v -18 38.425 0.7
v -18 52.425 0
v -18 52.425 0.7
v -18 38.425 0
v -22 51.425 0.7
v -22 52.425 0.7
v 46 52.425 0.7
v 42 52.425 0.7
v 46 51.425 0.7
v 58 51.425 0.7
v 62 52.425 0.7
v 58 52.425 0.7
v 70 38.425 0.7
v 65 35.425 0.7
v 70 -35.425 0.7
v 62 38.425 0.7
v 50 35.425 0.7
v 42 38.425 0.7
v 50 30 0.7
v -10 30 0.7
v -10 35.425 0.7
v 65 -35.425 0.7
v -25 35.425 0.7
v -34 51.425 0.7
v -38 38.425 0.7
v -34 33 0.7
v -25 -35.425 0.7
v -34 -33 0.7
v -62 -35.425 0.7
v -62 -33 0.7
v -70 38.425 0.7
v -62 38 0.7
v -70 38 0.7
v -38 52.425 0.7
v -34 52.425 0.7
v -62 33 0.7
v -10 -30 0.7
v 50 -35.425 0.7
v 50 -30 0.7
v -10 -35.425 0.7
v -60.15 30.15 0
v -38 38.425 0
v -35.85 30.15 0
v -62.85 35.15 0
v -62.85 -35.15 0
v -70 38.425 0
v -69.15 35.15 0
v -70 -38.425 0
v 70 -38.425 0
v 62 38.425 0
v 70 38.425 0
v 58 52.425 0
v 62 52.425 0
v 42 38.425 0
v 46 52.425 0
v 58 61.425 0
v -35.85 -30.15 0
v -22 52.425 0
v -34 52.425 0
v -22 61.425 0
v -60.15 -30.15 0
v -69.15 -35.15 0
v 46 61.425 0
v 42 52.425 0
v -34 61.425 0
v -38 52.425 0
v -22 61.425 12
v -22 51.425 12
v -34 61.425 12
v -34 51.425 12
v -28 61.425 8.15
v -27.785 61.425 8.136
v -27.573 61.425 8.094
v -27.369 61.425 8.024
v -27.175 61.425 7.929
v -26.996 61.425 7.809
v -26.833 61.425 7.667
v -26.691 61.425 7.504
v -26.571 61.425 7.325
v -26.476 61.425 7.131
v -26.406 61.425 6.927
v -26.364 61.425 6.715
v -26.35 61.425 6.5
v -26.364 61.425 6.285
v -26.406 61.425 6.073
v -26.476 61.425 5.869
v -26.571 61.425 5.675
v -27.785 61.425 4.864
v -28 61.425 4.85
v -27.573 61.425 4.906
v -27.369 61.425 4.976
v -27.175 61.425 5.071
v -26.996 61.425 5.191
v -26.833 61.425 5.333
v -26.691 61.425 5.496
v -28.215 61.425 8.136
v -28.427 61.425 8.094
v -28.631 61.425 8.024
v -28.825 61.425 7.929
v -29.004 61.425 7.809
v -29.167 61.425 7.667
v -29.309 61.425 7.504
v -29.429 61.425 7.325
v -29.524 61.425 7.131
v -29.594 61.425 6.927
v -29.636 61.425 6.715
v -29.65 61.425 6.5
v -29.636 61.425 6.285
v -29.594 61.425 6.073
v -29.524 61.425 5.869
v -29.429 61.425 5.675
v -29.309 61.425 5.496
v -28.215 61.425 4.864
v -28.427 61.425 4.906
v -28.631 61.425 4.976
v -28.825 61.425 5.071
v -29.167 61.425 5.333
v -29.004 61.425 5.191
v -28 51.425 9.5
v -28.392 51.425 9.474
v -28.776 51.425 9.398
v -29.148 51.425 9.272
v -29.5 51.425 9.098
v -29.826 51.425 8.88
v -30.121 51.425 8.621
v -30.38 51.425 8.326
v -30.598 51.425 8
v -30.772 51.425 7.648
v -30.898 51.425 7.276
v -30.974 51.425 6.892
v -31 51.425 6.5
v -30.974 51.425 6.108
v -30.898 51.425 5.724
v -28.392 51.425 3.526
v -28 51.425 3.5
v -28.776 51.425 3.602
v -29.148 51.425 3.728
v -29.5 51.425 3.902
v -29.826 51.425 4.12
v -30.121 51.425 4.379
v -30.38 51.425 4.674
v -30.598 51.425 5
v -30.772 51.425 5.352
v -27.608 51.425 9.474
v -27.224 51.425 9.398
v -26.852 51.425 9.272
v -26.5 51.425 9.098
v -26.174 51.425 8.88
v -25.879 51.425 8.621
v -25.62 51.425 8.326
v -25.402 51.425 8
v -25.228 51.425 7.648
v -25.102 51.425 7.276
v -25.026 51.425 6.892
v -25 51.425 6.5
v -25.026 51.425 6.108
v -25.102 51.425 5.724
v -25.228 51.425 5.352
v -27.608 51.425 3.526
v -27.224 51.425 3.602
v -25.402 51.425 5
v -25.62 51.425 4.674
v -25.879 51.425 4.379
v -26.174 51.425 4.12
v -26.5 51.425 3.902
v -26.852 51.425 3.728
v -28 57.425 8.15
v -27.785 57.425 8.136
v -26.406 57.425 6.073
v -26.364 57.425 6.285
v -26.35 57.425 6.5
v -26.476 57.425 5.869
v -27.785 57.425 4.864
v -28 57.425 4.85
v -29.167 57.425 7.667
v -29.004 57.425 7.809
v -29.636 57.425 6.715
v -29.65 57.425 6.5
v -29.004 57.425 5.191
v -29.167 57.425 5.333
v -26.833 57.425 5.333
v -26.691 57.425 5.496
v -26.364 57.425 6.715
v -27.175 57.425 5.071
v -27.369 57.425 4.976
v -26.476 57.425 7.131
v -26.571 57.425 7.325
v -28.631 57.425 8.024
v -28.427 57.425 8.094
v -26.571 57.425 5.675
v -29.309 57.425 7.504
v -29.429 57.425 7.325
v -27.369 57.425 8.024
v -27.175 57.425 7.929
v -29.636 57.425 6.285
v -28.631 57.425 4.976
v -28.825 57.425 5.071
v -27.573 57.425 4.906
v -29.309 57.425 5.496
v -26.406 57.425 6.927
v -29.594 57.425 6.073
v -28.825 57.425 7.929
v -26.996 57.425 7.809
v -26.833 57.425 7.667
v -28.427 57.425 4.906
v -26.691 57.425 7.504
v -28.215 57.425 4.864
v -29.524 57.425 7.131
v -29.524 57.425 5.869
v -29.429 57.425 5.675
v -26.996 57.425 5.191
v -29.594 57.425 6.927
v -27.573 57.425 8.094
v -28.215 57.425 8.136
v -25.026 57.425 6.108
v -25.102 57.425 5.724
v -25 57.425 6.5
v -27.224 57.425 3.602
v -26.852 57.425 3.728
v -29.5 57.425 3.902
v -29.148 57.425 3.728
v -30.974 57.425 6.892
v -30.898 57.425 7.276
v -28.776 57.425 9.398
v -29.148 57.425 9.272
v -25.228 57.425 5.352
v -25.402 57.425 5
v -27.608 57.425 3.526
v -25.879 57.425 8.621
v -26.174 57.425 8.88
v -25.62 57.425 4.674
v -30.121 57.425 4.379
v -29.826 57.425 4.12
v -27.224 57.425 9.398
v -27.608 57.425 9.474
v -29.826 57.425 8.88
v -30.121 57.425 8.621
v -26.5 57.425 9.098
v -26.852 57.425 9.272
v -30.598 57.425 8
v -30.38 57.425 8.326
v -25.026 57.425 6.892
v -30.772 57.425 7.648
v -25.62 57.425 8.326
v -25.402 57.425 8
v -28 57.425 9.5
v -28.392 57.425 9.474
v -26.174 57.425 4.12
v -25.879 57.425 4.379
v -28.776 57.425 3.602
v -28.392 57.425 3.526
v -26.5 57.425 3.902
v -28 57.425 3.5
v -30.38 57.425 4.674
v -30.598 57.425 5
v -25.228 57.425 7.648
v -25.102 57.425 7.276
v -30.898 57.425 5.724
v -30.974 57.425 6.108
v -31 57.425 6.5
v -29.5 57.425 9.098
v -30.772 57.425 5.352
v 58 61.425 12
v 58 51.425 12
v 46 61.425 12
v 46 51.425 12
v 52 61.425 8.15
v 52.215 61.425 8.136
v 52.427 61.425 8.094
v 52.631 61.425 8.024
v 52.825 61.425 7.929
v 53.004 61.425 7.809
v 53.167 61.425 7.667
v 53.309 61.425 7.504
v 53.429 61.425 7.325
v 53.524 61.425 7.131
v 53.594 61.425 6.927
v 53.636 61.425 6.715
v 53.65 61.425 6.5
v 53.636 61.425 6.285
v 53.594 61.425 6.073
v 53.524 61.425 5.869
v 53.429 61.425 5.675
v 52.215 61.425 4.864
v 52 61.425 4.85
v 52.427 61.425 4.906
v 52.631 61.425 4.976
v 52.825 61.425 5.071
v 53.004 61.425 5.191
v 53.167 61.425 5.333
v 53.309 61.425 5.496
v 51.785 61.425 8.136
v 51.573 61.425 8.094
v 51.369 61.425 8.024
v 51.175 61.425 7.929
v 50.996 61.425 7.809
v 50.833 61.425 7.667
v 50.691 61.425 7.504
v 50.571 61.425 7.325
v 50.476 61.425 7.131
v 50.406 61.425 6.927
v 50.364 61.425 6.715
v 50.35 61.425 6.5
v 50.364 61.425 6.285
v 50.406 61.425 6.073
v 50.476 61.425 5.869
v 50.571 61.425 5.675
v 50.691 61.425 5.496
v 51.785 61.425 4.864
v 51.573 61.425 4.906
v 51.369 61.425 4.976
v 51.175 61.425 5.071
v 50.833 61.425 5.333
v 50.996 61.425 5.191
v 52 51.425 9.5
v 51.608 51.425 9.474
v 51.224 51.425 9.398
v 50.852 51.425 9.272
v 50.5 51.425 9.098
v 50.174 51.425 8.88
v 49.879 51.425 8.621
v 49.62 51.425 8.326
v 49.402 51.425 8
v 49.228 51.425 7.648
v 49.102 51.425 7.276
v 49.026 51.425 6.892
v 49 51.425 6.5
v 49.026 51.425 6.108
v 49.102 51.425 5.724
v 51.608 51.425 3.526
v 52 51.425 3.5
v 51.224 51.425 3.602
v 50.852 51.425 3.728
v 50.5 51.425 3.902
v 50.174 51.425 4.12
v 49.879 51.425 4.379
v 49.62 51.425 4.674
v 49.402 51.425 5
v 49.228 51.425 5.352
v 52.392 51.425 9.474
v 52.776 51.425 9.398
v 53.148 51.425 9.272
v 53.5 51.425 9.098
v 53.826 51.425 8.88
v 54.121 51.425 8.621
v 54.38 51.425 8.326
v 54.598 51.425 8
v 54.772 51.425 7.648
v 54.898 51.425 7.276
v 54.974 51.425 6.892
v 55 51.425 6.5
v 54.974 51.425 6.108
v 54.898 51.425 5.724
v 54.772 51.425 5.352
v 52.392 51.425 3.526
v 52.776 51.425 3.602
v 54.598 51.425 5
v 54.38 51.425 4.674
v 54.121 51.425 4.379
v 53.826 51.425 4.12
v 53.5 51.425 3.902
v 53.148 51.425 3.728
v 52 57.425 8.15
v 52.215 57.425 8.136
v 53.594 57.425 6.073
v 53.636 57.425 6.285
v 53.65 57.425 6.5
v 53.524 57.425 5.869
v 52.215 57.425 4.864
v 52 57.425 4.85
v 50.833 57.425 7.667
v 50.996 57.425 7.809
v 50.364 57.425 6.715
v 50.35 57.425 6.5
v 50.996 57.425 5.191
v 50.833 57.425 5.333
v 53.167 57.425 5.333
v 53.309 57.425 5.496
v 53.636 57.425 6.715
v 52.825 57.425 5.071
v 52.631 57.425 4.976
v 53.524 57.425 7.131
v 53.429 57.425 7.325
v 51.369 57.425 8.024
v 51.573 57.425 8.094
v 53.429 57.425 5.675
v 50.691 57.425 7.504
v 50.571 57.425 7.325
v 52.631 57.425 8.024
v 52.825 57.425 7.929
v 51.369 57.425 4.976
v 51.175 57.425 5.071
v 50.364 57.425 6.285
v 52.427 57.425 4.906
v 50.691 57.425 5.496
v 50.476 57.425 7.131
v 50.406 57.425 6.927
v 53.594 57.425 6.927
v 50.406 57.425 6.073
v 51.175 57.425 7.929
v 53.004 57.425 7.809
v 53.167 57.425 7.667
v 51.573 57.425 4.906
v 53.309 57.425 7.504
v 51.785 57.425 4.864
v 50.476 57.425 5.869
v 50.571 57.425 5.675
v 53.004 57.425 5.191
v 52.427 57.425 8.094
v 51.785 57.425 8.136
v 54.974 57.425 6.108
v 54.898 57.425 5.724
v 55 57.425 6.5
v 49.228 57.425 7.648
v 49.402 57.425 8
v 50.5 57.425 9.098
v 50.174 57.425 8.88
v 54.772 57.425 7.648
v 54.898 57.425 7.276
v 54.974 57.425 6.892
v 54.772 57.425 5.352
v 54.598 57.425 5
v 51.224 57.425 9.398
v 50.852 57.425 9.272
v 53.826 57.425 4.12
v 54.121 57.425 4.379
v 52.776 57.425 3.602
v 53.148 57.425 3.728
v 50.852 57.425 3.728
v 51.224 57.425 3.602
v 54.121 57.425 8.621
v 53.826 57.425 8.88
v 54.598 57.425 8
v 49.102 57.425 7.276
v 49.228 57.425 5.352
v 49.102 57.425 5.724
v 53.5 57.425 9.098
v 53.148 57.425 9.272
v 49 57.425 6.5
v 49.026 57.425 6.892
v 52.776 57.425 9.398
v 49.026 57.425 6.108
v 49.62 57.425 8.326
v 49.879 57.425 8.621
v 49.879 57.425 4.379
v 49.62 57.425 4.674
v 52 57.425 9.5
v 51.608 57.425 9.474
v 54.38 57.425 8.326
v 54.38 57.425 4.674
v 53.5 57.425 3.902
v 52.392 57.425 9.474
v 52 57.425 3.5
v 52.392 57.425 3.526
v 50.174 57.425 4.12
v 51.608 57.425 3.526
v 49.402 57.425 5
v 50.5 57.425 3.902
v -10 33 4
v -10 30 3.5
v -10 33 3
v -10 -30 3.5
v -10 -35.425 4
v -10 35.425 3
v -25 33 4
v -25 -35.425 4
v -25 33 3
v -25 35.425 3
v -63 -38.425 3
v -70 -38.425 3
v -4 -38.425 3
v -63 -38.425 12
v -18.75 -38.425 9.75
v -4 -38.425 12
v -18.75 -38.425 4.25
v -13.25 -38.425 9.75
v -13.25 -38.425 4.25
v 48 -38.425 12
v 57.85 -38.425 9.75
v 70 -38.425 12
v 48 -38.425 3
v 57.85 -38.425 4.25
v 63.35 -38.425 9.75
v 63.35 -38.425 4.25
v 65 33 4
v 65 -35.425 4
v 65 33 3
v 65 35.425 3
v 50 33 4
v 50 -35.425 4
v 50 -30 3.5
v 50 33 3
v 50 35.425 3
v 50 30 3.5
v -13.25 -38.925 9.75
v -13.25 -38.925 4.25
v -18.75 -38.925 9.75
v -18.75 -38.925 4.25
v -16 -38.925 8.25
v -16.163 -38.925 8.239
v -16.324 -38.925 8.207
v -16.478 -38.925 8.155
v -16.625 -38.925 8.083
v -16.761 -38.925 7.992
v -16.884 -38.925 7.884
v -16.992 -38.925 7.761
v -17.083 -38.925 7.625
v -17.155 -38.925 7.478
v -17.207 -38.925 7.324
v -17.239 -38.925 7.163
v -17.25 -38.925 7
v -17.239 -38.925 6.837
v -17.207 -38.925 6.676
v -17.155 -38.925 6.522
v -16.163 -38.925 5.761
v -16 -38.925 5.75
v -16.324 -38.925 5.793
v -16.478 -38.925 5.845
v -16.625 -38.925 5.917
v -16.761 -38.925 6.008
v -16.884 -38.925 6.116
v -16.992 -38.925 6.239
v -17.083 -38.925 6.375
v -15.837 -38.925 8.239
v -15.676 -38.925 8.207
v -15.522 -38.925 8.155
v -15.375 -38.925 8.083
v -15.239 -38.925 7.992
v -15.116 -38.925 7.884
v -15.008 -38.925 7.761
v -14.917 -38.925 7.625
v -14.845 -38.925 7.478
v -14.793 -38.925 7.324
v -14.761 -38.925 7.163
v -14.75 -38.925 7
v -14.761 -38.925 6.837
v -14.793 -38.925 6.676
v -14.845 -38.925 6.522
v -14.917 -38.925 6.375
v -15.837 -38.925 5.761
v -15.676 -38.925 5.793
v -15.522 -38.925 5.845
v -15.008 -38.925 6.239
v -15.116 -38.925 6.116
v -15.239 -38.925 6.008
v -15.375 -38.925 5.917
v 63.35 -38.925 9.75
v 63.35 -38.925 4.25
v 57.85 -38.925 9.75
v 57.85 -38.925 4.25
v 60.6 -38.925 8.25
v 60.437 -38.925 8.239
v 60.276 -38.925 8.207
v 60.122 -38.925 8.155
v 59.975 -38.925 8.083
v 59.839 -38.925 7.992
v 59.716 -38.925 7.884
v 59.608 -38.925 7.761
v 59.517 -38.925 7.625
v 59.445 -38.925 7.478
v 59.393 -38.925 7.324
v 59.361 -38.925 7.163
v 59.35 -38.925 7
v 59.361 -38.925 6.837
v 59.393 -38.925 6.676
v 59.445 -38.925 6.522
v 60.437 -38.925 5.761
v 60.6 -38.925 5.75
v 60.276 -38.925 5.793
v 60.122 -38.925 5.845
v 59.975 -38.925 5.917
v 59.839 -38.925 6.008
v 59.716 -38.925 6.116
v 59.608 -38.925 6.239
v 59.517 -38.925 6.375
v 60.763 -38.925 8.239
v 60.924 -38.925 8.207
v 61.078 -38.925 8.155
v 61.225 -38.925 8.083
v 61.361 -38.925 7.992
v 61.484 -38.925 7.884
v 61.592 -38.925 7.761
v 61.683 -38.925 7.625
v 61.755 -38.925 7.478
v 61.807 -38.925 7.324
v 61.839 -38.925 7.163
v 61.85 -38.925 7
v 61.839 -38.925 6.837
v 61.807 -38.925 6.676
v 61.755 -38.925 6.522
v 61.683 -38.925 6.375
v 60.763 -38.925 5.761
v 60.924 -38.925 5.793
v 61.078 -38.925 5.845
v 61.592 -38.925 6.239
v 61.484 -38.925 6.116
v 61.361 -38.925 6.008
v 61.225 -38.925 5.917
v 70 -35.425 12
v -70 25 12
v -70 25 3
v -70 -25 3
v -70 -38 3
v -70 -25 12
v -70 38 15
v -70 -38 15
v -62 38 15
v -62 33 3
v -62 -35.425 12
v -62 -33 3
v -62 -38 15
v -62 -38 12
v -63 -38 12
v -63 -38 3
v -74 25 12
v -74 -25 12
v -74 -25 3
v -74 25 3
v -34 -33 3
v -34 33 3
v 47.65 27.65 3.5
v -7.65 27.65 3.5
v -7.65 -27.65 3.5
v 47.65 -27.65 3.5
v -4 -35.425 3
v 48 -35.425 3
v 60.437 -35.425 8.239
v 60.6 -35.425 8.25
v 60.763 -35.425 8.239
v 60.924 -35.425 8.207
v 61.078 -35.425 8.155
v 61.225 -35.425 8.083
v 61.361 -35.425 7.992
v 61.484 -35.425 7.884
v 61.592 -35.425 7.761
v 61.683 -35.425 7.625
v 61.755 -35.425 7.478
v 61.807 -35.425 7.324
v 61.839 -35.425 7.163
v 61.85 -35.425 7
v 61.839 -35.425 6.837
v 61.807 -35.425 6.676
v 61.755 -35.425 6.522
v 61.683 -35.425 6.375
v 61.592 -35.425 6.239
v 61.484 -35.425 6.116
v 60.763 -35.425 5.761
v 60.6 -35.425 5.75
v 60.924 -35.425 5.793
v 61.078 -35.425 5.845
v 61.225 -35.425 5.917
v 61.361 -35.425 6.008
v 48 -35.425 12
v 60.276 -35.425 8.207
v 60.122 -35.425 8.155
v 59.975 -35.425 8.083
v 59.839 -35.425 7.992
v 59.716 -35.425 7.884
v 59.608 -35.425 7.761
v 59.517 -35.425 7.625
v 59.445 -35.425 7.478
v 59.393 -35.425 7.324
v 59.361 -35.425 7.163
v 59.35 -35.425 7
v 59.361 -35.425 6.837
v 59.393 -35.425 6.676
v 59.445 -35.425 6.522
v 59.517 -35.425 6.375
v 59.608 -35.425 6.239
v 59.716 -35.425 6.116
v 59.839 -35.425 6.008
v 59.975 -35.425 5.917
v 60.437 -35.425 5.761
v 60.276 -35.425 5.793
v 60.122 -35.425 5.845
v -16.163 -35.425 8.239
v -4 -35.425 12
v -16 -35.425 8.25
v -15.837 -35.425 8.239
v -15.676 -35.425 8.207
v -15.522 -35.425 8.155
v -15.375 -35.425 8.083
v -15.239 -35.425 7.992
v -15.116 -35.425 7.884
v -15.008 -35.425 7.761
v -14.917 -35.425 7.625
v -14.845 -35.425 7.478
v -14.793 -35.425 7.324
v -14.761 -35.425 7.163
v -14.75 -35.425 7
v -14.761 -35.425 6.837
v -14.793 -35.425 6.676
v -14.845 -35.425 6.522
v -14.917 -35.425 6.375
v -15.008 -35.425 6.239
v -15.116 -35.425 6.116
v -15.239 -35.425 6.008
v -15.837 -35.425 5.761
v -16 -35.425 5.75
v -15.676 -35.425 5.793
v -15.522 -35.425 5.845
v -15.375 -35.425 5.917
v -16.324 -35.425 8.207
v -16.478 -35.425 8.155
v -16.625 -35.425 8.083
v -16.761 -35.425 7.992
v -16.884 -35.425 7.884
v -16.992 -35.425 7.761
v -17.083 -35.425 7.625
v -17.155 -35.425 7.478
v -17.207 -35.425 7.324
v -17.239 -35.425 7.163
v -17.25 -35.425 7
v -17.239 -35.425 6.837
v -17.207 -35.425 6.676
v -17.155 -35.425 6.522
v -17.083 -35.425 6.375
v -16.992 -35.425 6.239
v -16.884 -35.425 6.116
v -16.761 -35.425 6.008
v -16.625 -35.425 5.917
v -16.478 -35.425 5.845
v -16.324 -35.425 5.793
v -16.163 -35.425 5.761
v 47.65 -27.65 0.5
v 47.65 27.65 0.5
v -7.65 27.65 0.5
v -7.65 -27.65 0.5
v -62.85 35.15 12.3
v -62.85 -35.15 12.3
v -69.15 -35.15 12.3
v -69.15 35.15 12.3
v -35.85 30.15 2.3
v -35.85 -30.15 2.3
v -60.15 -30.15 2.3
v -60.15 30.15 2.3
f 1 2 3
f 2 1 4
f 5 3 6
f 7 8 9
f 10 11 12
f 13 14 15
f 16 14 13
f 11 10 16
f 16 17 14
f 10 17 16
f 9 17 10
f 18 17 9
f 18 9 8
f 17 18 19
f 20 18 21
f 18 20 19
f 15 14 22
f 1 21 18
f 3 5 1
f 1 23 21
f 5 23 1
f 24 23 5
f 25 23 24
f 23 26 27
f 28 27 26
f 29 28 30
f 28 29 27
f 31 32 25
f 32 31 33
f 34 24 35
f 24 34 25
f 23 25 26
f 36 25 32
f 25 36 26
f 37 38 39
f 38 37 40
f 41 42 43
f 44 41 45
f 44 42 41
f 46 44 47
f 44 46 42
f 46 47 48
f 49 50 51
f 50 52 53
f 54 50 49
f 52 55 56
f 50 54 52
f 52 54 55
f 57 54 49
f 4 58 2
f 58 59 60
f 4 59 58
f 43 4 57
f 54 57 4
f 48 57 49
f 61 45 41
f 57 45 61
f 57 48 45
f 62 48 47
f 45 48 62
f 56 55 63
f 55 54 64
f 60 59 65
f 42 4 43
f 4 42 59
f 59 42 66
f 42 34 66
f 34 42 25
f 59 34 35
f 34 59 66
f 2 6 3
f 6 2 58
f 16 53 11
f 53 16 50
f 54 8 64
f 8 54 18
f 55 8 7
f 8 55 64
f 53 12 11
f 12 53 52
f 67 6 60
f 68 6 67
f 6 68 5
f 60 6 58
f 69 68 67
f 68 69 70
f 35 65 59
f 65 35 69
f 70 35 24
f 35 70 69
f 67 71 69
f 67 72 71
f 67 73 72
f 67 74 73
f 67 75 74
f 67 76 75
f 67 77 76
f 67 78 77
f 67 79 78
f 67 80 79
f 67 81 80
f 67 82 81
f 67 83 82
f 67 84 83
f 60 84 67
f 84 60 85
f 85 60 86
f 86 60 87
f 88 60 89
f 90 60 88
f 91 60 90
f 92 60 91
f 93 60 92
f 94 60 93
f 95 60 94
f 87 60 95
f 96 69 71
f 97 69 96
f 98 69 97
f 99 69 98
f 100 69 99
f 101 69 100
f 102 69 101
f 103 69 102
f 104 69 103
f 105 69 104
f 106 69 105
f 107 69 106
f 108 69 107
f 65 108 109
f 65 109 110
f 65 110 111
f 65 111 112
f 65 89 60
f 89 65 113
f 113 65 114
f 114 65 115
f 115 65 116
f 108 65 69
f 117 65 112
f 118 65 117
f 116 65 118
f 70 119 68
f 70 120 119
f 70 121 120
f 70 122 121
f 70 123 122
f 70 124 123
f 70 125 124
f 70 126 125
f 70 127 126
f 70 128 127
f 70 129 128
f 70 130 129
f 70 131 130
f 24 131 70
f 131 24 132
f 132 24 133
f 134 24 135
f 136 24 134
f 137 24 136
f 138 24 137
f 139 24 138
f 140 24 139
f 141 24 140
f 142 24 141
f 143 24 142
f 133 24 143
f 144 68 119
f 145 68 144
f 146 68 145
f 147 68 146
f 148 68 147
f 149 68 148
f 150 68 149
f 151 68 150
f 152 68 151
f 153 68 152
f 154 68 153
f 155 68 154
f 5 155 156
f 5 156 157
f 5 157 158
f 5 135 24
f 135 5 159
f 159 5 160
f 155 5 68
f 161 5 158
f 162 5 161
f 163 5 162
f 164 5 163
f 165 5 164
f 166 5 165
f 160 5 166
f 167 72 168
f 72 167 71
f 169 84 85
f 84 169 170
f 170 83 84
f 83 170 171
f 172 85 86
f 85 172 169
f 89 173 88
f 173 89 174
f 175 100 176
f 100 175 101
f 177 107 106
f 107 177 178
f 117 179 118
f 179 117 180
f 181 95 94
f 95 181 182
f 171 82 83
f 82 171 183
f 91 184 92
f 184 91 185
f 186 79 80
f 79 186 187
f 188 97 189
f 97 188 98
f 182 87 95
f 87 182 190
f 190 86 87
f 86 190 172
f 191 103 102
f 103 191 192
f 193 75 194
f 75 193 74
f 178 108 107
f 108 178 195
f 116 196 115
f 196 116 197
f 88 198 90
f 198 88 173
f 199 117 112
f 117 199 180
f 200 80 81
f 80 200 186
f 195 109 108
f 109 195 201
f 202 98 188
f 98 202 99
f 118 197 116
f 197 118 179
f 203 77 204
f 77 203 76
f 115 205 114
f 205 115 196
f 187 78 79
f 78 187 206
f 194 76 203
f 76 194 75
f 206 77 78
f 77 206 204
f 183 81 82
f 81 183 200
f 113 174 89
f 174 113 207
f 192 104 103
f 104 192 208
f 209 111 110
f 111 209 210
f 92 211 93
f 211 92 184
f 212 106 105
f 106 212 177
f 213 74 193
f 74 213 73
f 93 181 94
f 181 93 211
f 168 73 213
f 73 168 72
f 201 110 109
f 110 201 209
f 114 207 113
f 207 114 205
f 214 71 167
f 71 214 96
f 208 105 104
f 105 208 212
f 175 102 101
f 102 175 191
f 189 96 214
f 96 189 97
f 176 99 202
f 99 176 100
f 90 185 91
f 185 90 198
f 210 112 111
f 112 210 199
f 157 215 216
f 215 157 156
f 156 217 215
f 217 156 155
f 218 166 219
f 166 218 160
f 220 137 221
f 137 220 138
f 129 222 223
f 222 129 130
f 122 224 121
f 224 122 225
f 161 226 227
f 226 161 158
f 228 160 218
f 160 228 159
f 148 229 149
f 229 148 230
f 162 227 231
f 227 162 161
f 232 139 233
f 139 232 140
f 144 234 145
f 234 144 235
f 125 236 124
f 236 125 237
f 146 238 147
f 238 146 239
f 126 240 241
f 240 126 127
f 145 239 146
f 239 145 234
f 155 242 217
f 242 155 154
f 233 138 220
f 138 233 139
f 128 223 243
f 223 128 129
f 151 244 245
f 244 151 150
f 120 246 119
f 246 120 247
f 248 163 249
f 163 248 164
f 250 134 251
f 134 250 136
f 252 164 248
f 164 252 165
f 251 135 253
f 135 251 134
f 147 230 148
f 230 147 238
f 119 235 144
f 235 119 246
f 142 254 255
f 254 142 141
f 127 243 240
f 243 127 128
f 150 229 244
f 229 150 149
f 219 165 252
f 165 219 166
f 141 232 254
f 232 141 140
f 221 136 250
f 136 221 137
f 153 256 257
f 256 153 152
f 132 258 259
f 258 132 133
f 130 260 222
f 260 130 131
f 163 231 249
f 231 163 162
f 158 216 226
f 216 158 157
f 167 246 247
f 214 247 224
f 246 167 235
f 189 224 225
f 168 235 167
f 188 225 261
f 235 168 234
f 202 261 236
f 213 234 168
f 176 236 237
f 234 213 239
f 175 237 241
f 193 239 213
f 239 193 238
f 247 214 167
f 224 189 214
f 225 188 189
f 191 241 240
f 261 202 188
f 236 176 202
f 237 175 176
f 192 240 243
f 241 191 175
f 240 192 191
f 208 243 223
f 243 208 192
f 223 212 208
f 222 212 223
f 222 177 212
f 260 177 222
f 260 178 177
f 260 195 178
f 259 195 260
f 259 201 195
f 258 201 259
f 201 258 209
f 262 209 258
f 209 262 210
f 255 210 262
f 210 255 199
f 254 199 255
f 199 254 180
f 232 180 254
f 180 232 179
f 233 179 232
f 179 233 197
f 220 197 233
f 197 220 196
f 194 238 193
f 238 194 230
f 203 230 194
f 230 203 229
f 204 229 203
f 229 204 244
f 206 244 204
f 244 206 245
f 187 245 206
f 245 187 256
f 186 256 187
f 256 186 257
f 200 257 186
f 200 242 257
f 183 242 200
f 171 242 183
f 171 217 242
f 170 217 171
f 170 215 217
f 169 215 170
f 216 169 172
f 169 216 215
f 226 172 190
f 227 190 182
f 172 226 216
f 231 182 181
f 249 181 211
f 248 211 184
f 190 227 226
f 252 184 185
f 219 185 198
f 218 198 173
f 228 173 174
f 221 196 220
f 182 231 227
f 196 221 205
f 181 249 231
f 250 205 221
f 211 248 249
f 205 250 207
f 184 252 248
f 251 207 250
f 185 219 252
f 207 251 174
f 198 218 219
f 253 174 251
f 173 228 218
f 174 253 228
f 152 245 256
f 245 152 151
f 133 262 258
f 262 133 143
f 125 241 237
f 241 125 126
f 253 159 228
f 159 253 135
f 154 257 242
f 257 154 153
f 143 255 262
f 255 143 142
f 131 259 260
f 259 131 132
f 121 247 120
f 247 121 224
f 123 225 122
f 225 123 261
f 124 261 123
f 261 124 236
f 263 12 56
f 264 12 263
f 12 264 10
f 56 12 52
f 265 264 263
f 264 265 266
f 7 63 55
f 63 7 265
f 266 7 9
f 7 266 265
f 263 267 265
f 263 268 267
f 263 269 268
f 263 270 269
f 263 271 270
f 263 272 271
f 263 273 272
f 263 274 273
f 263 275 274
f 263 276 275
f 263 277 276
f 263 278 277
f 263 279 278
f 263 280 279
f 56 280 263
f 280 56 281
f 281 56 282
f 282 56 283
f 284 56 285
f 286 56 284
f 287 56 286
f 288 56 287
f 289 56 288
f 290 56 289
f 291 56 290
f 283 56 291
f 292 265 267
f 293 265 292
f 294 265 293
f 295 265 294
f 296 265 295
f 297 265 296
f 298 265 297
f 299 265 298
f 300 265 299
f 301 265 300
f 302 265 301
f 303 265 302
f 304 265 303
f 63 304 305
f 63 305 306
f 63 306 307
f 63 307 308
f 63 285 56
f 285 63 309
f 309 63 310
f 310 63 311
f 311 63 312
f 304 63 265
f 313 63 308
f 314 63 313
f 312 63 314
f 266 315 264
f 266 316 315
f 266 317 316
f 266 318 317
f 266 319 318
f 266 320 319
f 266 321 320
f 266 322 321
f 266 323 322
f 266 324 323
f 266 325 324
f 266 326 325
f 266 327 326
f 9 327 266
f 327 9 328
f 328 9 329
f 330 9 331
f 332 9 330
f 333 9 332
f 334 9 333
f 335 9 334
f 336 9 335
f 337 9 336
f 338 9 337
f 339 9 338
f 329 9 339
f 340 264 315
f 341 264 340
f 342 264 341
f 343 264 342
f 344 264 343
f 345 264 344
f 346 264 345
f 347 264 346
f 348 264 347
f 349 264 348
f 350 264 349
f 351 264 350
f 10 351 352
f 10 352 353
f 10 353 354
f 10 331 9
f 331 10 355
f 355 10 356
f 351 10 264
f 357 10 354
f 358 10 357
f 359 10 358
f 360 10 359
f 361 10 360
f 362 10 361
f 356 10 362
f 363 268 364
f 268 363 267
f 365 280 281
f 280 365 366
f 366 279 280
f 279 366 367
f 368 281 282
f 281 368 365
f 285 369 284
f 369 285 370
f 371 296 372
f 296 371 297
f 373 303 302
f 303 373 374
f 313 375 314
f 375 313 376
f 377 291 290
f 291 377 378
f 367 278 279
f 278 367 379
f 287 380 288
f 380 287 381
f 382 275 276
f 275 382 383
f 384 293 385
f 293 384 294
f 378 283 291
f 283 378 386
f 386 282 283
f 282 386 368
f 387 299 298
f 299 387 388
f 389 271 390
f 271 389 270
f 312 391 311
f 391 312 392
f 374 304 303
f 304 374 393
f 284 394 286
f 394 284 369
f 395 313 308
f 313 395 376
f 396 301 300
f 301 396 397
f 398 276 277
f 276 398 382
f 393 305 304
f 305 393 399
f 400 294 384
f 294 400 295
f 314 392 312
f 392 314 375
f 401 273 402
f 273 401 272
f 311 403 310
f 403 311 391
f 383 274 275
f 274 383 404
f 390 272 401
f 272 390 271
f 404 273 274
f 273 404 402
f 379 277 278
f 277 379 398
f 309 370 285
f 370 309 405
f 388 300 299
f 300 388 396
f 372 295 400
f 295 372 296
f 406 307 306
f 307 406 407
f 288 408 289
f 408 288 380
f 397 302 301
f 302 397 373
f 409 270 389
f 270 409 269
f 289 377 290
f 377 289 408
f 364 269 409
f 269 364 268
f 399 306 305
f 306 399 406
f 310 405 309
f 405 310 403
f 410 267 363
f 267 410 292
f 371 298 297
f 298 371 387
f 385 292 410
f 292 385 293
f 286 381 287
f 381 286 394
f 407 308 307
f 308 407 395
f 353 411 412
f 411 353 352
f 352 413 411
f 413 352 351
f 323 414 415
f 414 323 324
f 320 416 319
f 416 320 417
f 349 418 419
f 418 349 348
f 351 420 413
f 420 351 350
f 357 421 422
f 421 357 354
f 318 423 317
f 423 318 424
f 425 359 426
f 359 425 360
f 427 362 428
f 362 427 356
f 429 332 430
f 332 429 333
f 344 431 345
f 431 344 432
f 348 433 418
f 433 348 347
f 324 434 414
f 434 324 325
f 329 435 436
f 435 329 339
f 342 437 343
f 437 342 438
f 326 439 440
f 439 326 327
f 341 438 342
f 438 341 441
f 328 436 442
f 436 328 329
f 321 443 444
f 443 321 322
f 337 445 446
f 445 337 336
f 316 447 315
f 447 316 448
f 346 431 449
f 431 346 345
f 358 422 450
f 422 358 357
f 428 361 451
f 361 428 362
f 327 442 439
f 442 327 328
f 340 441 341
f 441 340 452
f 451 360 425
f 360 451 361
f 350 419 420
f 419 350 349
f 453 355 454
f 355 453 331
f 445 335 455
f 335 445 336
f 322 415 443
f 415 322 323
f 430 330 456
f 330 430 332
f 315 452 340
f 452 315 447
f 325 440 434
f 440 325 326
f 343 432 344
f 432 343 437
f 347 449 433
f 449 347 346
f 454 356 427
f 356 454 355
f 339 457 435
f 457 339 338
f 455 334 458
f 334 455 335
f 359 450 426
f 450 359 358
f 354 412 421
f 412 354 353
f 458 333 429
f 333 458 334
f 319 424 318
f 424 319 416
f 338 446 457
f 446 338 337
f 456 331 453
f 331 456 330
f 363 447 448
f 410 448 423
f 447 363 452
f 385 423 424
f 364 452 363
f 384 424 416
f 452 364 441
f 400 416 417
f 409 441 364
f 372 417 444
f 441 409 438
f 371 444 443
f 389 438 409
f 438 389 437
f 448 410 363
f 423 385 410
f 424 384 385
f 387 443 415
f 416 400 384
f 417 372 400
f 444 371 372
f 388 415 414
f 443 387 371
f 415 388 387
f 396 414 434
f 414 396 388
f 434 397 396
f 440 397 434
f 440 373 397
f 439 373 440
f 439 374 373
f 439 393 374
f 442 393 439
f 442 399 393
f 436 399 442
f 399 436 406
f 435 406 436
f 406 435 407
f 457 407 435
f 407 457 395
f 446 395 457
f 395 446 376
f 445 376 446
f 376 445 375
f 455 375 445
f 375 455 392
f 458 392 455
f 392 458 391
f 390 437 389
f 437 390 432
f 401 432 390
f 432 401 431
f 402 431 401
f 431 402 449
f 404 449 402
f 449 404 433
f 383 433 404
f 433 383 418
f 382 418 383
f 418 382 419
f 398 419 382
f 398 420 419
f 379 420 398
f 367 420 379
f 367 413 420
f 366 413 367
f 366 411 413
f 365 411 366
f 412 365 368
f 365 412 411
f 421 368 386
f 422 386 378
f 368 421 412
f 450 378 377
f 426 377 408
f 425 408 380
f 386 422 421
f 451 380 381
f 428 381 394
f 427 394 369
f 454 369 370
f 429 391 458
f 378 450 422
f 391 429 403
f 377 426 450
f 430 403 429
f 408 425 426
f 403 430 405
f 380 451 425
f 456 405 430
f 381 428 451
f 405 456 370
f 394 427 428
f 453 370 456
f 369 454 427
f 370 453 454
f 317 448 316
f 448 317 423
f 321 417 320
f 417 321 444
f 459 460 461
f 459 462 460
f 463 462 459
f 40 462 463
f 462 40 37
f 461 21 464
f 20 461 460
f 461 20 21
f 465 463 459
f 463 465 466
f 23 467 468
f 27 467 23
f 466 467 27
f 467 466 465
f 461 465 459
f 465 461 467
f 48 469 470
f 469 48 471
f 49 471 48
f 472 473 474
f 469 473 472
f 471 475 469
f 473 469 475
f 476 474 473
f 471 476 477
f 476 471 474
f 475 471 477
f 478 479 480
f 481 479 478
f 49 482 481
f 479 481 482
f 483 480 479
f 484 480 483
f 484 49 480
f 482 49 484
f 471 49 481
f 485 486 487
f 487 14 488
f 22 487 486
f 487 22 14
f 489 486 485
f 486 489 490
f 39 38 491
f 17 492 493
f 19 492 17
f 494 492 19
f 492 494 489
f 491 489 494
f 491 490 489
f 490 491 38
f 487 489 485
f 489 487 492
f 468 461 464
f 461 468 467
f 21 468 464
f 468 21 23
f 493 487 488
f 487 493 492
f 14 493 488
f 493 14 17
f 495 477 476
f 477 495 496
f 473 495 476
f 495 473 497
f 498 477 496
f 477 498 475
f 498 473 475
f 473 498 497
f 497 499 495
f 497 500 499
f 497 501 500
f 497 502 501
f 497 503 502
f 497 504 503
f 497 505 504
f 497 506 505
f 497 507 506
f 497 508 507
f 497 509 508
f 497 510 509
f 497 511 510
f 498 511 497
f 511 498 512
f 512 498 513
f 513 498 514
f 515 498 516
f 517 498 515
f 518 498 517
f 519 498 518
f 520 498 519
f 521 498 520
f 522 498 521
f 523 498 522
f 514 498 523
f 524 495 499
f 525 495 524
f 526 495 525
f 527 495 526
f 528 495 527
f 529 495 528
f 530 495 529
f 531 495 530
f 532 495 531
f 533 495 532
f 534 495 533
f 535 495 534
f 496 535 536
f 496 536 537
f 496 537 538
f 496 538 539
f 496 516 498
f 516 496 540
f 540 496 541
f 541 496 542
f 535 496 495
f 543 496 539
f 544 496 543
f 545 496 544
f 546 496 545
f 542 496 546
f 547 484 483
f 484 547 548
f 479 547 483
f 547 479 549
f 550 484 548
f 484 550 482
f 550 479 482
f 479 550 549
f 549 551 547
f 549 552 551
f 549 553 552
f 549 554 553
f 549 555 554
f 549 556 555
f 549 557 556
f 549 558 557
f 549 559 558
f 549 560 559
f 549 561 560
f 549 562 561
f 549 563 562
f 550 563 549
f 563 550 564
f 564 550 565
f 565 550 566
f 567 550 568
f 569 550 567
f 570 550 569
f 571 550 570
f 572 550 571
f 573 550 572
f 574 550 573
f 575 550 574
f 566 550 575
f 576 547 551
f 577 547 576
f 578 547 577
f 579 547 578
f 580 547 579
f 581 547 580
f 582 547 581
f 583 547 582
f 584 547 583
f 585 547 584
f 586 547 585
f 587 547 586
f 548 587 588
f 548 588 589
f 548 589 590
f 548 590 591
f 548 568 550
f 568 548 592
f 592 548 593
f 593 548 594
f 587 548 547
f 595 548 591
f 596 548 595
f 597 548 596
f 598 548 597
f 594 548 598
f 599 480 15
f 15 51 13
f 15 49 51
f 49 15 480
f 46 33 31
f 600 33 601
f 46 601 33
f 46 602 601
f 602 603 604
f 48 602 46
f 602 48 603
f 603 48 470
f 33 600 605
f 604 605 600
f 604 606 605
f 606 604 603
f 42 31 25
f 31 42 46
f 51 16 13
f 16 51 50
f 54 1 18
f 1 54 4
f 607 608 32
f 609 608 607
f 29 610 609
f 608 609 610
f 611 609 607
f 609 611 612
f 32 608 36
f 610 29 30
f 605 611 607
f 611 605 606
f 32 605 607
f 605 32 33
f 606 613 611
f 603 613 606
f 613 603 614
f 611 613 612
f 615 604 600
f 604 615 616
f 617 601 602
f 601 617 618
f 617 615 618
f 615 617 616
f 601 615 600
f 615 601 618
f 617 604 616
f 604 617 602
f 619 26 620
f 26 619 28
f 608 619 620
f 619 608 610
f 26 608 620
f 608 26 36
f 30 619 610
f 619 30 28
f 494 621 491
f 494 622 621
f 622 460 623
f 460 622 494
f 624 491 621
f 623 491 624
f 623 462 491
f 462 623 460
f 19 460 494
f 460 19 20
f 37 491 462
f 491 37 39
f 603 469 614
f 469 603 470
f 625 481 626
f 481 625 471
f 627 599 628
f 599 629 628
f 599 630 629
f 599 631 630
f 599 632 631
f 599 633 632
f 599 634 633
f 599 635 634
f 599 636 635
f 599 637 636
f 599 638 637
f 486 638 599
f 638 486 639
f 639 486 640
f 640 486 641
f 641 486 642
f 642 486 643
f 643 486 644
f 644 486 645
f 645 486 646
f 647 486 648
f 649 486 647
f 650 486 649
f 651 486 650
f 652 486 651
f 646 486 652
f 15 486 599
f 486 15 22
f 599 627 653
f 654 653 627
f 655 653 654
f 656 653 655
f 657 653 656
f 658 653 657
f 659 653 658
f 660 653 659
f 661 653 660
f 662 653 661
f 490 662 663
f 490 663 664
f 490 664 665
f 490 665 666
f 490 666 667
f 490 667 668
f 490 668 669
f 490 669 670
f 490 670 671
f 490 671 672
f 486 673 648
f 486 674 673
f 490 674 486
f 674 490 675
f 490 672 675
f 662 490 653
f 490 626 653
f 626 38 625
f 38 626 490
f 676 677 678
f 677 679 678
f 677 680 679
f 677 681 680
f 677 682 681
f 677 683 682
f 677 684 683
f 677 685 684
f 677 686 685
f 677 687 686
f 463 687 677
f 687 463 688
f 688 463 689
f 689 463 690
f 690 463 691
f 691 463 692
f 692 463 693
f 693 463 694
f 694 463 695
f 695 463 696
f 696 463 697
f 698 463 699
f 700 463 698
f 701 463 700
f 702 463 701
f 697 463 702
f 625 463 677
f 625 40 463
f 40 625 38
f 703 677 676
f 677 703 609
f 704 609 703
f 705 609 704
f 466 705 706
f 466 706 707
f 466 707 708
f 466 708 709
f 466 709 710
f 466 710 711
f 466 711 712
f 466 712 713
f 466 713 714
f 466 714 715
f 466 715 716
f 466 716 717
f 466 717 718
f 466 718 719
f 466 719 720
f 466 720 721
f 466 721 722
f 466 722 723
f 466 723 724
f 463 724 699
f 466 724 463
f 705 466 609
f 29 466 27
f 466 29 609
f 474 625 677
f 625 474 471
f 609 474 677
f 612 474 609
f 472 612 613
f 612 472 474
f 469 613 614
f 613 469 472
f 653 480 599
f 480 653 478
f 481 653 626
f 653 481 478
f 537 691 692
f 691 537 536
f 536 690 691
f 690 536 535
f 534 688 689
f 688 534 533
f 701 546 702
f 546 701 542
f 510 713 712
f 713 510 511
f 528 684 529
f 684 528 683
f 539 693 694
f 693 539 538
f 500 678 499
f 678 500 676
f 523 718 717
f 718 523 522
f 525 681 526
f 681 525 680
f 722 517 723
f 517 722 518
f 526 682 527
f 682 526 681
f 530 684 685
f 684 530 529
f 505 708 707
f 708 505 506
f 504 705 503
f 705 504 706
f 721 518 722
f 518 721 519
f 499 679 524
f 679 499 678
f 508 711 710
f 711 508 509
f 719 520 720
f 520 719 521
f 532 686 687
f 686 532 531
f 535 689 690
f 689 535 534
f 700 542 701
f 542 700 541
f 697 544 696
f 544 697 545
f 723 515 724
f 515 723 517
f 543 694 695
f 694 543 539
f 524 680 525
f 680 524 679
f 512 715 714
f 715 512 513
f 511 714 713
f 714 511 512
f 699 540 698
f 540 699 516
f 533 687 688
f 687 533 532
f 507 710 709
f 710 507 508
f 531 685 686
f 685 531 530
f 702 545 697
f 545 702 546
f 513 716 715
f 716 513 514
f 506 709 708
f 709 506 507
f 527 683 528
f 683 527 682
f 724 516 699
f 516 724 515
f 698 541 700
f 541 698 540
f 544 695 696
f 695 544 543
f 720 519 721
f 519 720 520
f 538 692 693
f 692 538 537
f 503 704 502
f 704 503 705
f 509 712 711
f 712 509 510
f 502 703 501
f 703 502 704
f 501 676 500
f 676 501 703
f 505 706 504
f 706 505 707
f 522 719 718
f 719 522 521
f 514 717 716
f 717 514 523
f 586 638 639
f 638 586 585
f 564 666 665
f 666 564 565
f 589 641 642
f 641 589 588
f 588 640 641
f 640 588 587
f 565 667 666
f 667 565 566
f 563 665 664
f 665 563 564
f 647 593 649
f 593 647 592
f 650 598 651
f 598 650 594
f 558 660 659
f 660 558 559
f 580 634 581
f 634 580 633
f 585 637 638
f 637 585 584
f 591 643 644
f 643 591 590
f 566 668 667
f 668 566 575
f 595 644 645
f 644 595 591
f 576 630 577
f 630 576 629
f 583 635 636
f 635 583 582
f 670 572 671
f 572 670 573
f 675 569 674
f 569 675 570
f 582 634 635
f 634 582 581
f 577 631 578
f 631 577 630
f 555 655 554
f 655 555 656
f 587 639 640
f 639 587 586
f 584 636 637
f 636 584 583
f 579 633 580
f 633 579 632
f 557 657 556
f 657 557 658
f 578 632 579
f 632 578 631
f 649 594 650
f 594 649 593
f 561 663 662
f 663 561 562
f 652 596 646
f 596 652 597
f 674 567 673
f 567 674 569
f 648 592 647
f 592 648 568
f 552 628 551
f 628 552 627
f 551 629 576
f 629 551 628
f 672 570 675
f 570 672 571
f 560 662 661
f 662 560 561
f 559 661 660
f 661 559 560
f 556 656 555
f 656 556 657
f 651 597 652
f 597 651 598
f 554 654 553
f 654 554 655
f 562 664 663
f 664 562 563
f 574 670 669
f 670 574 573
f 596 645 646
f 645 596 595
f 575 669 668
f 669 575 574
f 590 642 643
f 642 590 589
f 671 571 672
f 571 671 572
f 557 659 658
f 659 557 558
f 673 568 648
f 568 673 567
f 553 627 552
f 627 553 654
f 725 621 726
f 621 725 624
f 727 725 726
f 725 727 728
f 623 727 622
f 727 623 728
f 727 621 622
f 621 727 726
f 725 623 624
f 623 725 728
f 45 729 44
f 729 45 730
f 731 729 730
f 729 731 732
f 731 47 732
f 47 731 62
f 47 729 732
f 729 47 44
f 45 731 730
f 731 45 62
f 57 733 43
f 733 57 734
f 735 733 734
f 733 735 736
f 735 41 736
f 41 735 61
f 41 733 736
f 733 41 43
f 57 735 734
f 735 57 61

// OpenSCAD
// file: guide_rod_mount.scad
// Guide-rod mount: the fixed block that each guide rod slides through, with a pocket for the rod's spring.
// It is printed as part of the carrier frame (carrier_frame.scad places two of them on base tongues outboard of the
// sprung rail), so the bore lines up with the rail's rod boss without any adjustment. Opening this file on its own
// shows one mount, in the carrier frame, at the first rod position.
//
// The rod is pressed into the sprung rail and slides in this mount's bore (ROD_D + SLIDE_CLR). The spring sits over
// the rod between the rail's boss and the bottom of the pocket; it pushes the rail closed. With the rail fully open
// the boss meets the mount's inner face: that is the 7 mm travel stop.

include <params.scad>
include <common.scad>

module guide_rod_mount(x) {
    difference() {
        box(x - MOUNT_W / 2, x + MOUNT_W / 2, MOUNT_Y0, MOUNT_Y1, 0, MOUNT_H);
        // sliding bore for the guide rod, right through
        ybore(x, MOUNT_Y0 - 1, MOUNT_Y1 + 1, ROD_Z, ROD_D + SLIDE_CLR);
        // spring pocket, open toward the rail
        ybore(x, MOUNT_Y0 - 1, MOUNT_Y0 + SPRING_POCKET, ROD_Z, SPRING_POCKET_D);
    }
}

guide_rod_mount(ROD_X[0]);
// file: common.scad
// Small helpers shared by the part files. Include after params.scad.

// An axis-aligned box given by its extents, as task.py's _mm(x0, x1, y0, y1, z0, z1) does.
module box(x0, x1, y0, y1, z0, z1) {
    translate([x0, y0, z0]) cube([x1 - x0, y1 - y0, z1 - z0]);
}

// A round hole or rod along +y from y0 to y1, its axis at (x, z).
module ybore(x, y0, y1, z, d) {
    translate([x, y0, z]) rotate([-90, 0, 0]) cylinder(d = d, h = y1 - y0);
}
// file: params.scad
// Shared dimensions for the printed carrier, sprung rail, guide-rod mounts and SSD dummy (all in mm, grams, N/mm).
//
// Every line is either
//   NAME = value; // task.py: <expression>   a number taken from task.py; check_params.py evaluates <expression>
//                                            against the imported task module (box(BOXES, i) gives a box's
//                                            [x0, x1, y0, y1, z0, z1] in mm) and asserts it equals value
//   NAME = value; // fab: <reason>           a fabrication choice (fit, hardware size); check_params.py checks
//                                            that these are consistent with the task numbers
// Keep one assignment per line and use only numbers, + - * /, names and [ ] lists: check_params.py parses this file.
//
// Frames, as in task.py:
//   carrier: origin on the table under the carrier's centre; x along the carrier, handle bezel toward -x, the drive's
//            connector end (rear) at +x; y across, the sprung rail at +y, the fixed rail at -y; z up.
//   SSD:     origin under the drive's centre on its bottom face; x along it, connector end toward +x; z up.

// ---- the SSD (task.py "the SSD, in its own frame") -----------------------------------------------------------------
SSD_L = 100; // task.py: SSD_L * 1000
SSD_W = 69.85; // task.py: SSD_W * 1000
SSD_H = 7; // task.py: SSD_H * 1000
SSD_MASS_G = 55; // task.py: SSD_MASS * 1000
HALF_W = 34.925; // task.py: HALF_W
HOLE_X = [-36.0, 40.6]; // task.py: HOLE_X
HOLE_Z = 3; // task.py: HOLE_Z
HOLE = 4; // task.py: HOLE
HOLE_DEPTH = 3; // task.py: HOLE_DEPTH
CONN_X = [44, 50]; // task.py: box(SSD_BOXES, 1)[0:2]
CONN_Y = [-31.925, 0]; // task.py: box(SSD_BOXES, 1)[2:4]
LABEL_X = [-42, 30]; // task.py: box(SSD_BOXES, 3)[0:2]
LABEL_Y = [-26, 26]; // task.py: box(SSD_BOXES, 3)[2:4]

// ---- the carrier (task.py "the carrier, in its own frame") ---------------------------------------------------------
CAR_L = 140; // task.py: CAR_L * 1000
CAR_W = 76; // task.py: CAR_W * 1000
CAR_H = 15; // task.py: CAR_H * 1000
CAR_MASS_G = 200; // task.py: CAR_MASS * 1000
SEAT_X = 20; // task.py: SX
SEAT_Z = 4; // task.py: SZ
GAP = 0.5; // task.py: GAP
PIN = 2.5; // task.py: PIN
PIN_IN = 2; // task.py: PIN_IN
RAIL_T = 3; // task.py: RAIL_T
RAIL_IN = 35.425; // task.py: RAIL_IN
RAIL_OUT = 38.425; // task.py: RAIL_OUT
PIN_X = [-16.0, 60.6]; // task.py: PIN_X
PIN_Z = 7; // task.py: PIN_Z
RAIL_SEGS = [[-61, -4], [48, 70]]; // task.py: RAIL_SEGS
RIB_X = [[-25, -10], [50, 65]]; // task.py: RIB_X
RIB_Y_END = 33; // task.py: box(CARRIER_BOXES, 3)[3]
BEZEL_X = [-70, -62]; // task.py: box(CARRIER_BOXES, 0)[0:2]
BEZEL_Y = 38; // task.py: box(CARRIER_BOXES, 0)[3]
HANDLE_X = [-74, -70]; // task.py: box(CARRIER_BOXES, 1)[0:2]
HANDLE_Y = 25; // task.py: box(CARRIER_BOXES, 1)[3]
HANDLE_Z = [3, 12]; // task.py: box(CARRIER_BOXES, 1)[4:6]
FLOOR_X = [-62, -34]; // task.py: box(CARRIER_BOXES, 2)[0:2]
FLOOR_Y = 33; // task.py: box(CARRIER_BOXES, 2)[3]
FLOOR_H = 3; // task.py: box(CARRIER_BOXES, 2)[5]
FIXED_BAR_X = [-70, 70]; // task.py: box(CARRIER_BOXES, 5)[0:2]
FIXED_BAR_H = 3; // task.py: box(CARRIER_BOXES, 5)[5]
FIXED_SEG0_X0 = -62; // task.py: box(CARRIER_BOXES, 6)[0]
RAIL_H = 12; // task.py: box(CARRIER_BOXES, 6)[5]

// ---- the sprung rail (task.py _latch_rail) -------------------------------------------------------------------------
RAIL_Z0 = 1; // task.py: box(rail.boxes, 0)[4]
RAIL_BAR_X = [-61, 70]; // task.py: box(rail.boxes, 2)[0:2]
RAIL_BAR_H = 3; // task.py: box(rail.boxes, 2)[5]
RAIL_TRAVEL = 7; // task.py: RAIL_TRAVEL * 1000
RAIL_RATE = 0.15; // task.py: RAIL_RATE / 1000
RAIL_MASS_G = 30; // task.py: rail.mass * 1000
TAB_X = [-61, -49]; // task.py: TAB_X
TAB_Y = [46.425, 48.925]; // task.py: TAB_Y
TAB_Z = [8, 34]; // task.py: TAB_Z
BRACKET_Z = [8, 12]; // task.py: box(rail.boxes, 3)[4:6]

// ---- print fits (fabrication choices) ------------------------------------------------------------------------------
SLIDE_CLR = 0.3; // fab: diametral clearance of a sliding fit (rod in its mount bore), and the rail's floor clearance
PRESS_CLR = 0; // fab: printed at nominal size for a press fit; horizontal printed holes come out slightly small
POCKET_CLR = 0.3; // fab: clearance round ballast plates and bars in their pockets
$fn = 48; // fab: facets on round holes

// ---- hardware (fabrication choices) --------------------------------------------------------------------------------
PIN_D = 2.5; // fab: 2.5 mm steel dowel pin, as wide as the task's 2.5 mm square pins (0.75 mm clear in a 4 mm hole)
PIN_L = 6; // fab: dowel pin length; PIN_IN + GAP stands proud of the rail, the rest is pressed in
PIN_BOSS = PIN_L - PIN_IN - GAP - RAIL_T; // fab: 0.5 mm pad on the rail's outer face so the pin sits flush there
ROD_D = 3; // fab: 3 mm ground steel rod (silver steel / drill rod / 3 mm linear shaft)
ROD_X = [-28, 52]; // fab: the two guide rods, one in each rail segment, clear of the pins and the pull tab
ROD_Z = 6.5; // fab: rod axis height, mid-height of the rail
BOSS_W = 8; // fab: width (along x) of the rod boss on the sprung rail's outer face
BOSS_L = 6; // fab: how far the rod boss stands out from the rail's outer face
ROD_EMBED = 8; // fab: depth of the blind press-fit bore for the rod in the rail and its boss
MOUNT_W = 12; // fab: guide-rod mount width along x
MOUNT_T = 10; // fab: guide-rod mount length along the rod (the sliding bore's length)
MOUNT_H = 12; // fab: guide-rod mount height
MOUNT_Y0 = RAIL_OUT + BOSS_L + RAIL_TRAVEL; // fab: the boss meets the mount's inner face at full travel (hard stop)
MOUNT_Y1 = MOUNT_Y0 + MOUNT_T; // fab: the mount's outer face
ROD_PROUD = 1; // fab: the rod stands 1 mm out of the mount's outer face with the rail closed
ROD_L = ROD_EMBED + RAIL_TRAVEL + MOUNT_T + ROD_PROUD; // fab: cut length of each guide rod (26 mm)
TONGUE_W = 20; // fab: width of the base web that carries each mount
N_SPRINGS = 2; // fab: one compression spring over each guide rod
SPRING_WIRE = 0.3; // fab: music (spring steel) wire diameter
SPRING_OD = 5; // fab: spring outside diameter (inside 4.4 mm, clear of the 3 mm rod)
SPRING_ACTIVE = 10; // fab: active coils; closed and ground ends add one dead coil at each end
SPRING_POCKET = 6; // fab: depth of the spring pocket in the mount; the spring's length at full travel
SPRING_PRELOAD = 0.5; // fab: compression already in each spring with the rail closed
SPRING_FREE = SPRING_POCKET + RAIL_TRAVEL + SPRING_PRELOAD; // fab: free length (13.5 mm)
SPRING_RATE = RAIL_RATE / N_SPRINGS; // fab: rate of each spring, 0.075 N/mm, so the pair matches the task's 150 N/m
SPRING_POCKET_D = SPRING_OD + 1; // fab: spring pocket diameter

// ---- the real fixture's floor and ballast (fabrication choices) ----------------------------------------------------
BASE_T = RAIL_Z0 - SLIDE_CLR; // fab: 0.7 mm base web under the whole carrier and the sprung rail, below the rail
STOP_H = 3; // fab: rib extensions up to y = RAIL_IN are the sprung rail's closed stop; they stay below the drive (4)
SLAB_X = [-10, 50]; // fab: ballast slab between the ribs, under the drive
SLAB_Y = 30; // fab: slab half-width (the fingers' room beside the drive is left open)
SLAB_H = 3.5; // fab: slab top, 0.5 mm below the seated drive's bottom face
SLAB_POCKET = [55, 55, 3]; // fab: steel ballast plate, 55 x 55 x 3 mm, set in from the top
BEZEL_POCKET = [6, 70, 12]; // fab: steel flat bar 6 x 12 mm, 70 mm long, set in the bezel from below
FLOOR_POCKET = [24, 60, 2]; // fab: steel plate 24 x 60 x 2 mm, set in the front floor plate from below
// main file
// Carrier frame: the handle bezel and release handle, front floor plate, two cross ribs the drive rests on, the
// fixed rail with its two pin bores, the sprung rail's closed stops, the two guide-rod mounts, and ballast pockets.
// Coordinates are the carrier frame of task.py (see params.scad). Print it as it lies: base down, no supports except
// under the release handle (HANDLE_Z[0] mm overhang).
//
// Additions to task.py's boxes, none of which the drive or the fingers touch:
//   - a BASE_T base web under the whole carrier, and two tongues of it that carry the guide-rod mounts;
//   - the ribs continue (STOP_H tall, below the drive) to y = RAIL_IN on the sprung side: the rail's closed stop;
//   - a ballast slab between the ribs, under the drive (top SLAB_H, below the seated drive's bottom at SEAT_Z);
//   - 0.5 mm pads on the fixed rail's outer face round the pin bores;
//   - pockets for steel ballast in the slab (from the top), the bezel and the front floor plate (from below).

include <params.scad>
include <common.scad>
use <guide_rod_mount.scad>

module carrier_frame() {
    difference() {
        union() {
            // base web under the carrier, from the bezel to the rear edge and from rail to rail
            box(BEZEL_X[0], CAR_L / 2, -RAIL_OUT, RAIL_OUT, 0, BASE_T);
            // tongues of the web carrying the guide-rod mounts, under the sprung rail's travel
            for (x = ROD_X) box(x - TONGUE_W / 2, x + TONGUE_W / 2, RAIL_OUT - 1, MOUNT_Y0 + 1, 0, BASE_T);
            for (x = ROD_X) guide_rod_mount(x);
            // handle bezel and its release handle
            box(BEZEL_X[0], BEZEL_X[1], -BEZEL_Y, BEZEL_Y, 0, CAR_H);
            box(HANDLE_X[0], HANDLE_X[1] + 1, -HANDLE_Y, HANDLE_Y, HANDLE_Z[0], HANDLE_Z[1]);
            // front floor plate
            box(FLOOR_X[0] - 1, FLOOR_X[1], -FLOOR_Y, FLOOR_Y, 0, FLOOR_H);
            // cross ribs the drive rests on (top at SEAT_Z), and their low extensions: the sprung rail's closed stop
            for (r = RIB_X) box(r[0], r[1], -RAIL_OUT, RIB_Y_END, 0, SEAT_Z);
            for (r = RIB_X) box(r[0], r[1], RIB_Y_END - 1, RAIL_IN, 0, STOP_H);
            // ballast slab between the ribs, under the drive
            box(SLAB_X[0], SLAB_X[1], -SLAB_Y, SLAB_Y, 0, SLAB_H);
            // fixed rail: base bar along the full length, and the two segments around the pins
            box(FIXED_BAR_X[0], FIXED_BAR_X[1], -RAIL_OUT, -RAIL_IN, 0, FIXED_BAR_H);
            box(FIXED_SEG0_X0 - 1, RAIL_SEGS[0][1], -RAIL_OUT, -RAIL_IN, 0, RAIL_H);
            box(RAIL_SEGS[1][0], RAIL_SEGS[1][1], -RAIL_OUT, -RAIL_IN, 0, RAIL_H);
            // pads round the pin bores on the fixed rail's outer face
            for (x = PIN_X)
                box(x - PIN_D / 2 - 1.5, x + PIN_D / 2 + 1.5, -RAIL_OUT - PIN_BOSS, -RAIL_OUT + 1,
                    PIN_Z - PIN_D / 2 - 1.5, PIN_Z + PIN_D / 2 + 1.5);
        }
        // press-fit bores for the two fixed dowel pins, right through the rail and its pad
        for (x = PIN_X) ybore(x, -RAIL_OUT - PIN_BOSS - 1, -RAIL_IN + 1, PIN_Z, PIN_D + PRESS_CLR);
        // ballast pocket in the slab, open at the top (the plate's top is flush with the slab, below the drive)
        translate([(SLAB_X[0] + SLAB_X[1]) / 2, 0, SLAB_H - SLAB_POCKET[2] + SLAB_POCKET[2] / 2 + 0.5])
            cube([SLAB_POCKET[0] + POCKET_CLR, SLAB_POCKET[1] + POCKET_CLR, SLAB_POCKET[2] + 1], center = true);
        // ballast pocket in the bezel, open underneath
        translate([(BEZEL_X[0] + BEZEL_X[1]) / 2, 0, (BEZEL_POCKET[2] + POCKET_CLR - 1) / 2])
            cube([BEZEL_POCKET[0] + POCKET_CLR, BEZEL_POCKET[1] + POCKET_CLR, BEZEL_POCKET[2] + POCKET_CLR + 1],
                 center = true);
        // ballast pocket in the front floor plate, open underneath
        translate([(FLOOR_X[0] + FLOOR_X[1]) / 2, 0, (FLOOR_POCKET[2] + POCKET_CLR - 1) / 2])
            cube([FLOOR_POCKET[0] + POCKET_CLR, FLOOR_POCKET[1] + POCKET_CLR, FLOOR_POCKET[2] + POCKET_CLR + 1],
                 center = true);
    }
}

carrier_frame();
